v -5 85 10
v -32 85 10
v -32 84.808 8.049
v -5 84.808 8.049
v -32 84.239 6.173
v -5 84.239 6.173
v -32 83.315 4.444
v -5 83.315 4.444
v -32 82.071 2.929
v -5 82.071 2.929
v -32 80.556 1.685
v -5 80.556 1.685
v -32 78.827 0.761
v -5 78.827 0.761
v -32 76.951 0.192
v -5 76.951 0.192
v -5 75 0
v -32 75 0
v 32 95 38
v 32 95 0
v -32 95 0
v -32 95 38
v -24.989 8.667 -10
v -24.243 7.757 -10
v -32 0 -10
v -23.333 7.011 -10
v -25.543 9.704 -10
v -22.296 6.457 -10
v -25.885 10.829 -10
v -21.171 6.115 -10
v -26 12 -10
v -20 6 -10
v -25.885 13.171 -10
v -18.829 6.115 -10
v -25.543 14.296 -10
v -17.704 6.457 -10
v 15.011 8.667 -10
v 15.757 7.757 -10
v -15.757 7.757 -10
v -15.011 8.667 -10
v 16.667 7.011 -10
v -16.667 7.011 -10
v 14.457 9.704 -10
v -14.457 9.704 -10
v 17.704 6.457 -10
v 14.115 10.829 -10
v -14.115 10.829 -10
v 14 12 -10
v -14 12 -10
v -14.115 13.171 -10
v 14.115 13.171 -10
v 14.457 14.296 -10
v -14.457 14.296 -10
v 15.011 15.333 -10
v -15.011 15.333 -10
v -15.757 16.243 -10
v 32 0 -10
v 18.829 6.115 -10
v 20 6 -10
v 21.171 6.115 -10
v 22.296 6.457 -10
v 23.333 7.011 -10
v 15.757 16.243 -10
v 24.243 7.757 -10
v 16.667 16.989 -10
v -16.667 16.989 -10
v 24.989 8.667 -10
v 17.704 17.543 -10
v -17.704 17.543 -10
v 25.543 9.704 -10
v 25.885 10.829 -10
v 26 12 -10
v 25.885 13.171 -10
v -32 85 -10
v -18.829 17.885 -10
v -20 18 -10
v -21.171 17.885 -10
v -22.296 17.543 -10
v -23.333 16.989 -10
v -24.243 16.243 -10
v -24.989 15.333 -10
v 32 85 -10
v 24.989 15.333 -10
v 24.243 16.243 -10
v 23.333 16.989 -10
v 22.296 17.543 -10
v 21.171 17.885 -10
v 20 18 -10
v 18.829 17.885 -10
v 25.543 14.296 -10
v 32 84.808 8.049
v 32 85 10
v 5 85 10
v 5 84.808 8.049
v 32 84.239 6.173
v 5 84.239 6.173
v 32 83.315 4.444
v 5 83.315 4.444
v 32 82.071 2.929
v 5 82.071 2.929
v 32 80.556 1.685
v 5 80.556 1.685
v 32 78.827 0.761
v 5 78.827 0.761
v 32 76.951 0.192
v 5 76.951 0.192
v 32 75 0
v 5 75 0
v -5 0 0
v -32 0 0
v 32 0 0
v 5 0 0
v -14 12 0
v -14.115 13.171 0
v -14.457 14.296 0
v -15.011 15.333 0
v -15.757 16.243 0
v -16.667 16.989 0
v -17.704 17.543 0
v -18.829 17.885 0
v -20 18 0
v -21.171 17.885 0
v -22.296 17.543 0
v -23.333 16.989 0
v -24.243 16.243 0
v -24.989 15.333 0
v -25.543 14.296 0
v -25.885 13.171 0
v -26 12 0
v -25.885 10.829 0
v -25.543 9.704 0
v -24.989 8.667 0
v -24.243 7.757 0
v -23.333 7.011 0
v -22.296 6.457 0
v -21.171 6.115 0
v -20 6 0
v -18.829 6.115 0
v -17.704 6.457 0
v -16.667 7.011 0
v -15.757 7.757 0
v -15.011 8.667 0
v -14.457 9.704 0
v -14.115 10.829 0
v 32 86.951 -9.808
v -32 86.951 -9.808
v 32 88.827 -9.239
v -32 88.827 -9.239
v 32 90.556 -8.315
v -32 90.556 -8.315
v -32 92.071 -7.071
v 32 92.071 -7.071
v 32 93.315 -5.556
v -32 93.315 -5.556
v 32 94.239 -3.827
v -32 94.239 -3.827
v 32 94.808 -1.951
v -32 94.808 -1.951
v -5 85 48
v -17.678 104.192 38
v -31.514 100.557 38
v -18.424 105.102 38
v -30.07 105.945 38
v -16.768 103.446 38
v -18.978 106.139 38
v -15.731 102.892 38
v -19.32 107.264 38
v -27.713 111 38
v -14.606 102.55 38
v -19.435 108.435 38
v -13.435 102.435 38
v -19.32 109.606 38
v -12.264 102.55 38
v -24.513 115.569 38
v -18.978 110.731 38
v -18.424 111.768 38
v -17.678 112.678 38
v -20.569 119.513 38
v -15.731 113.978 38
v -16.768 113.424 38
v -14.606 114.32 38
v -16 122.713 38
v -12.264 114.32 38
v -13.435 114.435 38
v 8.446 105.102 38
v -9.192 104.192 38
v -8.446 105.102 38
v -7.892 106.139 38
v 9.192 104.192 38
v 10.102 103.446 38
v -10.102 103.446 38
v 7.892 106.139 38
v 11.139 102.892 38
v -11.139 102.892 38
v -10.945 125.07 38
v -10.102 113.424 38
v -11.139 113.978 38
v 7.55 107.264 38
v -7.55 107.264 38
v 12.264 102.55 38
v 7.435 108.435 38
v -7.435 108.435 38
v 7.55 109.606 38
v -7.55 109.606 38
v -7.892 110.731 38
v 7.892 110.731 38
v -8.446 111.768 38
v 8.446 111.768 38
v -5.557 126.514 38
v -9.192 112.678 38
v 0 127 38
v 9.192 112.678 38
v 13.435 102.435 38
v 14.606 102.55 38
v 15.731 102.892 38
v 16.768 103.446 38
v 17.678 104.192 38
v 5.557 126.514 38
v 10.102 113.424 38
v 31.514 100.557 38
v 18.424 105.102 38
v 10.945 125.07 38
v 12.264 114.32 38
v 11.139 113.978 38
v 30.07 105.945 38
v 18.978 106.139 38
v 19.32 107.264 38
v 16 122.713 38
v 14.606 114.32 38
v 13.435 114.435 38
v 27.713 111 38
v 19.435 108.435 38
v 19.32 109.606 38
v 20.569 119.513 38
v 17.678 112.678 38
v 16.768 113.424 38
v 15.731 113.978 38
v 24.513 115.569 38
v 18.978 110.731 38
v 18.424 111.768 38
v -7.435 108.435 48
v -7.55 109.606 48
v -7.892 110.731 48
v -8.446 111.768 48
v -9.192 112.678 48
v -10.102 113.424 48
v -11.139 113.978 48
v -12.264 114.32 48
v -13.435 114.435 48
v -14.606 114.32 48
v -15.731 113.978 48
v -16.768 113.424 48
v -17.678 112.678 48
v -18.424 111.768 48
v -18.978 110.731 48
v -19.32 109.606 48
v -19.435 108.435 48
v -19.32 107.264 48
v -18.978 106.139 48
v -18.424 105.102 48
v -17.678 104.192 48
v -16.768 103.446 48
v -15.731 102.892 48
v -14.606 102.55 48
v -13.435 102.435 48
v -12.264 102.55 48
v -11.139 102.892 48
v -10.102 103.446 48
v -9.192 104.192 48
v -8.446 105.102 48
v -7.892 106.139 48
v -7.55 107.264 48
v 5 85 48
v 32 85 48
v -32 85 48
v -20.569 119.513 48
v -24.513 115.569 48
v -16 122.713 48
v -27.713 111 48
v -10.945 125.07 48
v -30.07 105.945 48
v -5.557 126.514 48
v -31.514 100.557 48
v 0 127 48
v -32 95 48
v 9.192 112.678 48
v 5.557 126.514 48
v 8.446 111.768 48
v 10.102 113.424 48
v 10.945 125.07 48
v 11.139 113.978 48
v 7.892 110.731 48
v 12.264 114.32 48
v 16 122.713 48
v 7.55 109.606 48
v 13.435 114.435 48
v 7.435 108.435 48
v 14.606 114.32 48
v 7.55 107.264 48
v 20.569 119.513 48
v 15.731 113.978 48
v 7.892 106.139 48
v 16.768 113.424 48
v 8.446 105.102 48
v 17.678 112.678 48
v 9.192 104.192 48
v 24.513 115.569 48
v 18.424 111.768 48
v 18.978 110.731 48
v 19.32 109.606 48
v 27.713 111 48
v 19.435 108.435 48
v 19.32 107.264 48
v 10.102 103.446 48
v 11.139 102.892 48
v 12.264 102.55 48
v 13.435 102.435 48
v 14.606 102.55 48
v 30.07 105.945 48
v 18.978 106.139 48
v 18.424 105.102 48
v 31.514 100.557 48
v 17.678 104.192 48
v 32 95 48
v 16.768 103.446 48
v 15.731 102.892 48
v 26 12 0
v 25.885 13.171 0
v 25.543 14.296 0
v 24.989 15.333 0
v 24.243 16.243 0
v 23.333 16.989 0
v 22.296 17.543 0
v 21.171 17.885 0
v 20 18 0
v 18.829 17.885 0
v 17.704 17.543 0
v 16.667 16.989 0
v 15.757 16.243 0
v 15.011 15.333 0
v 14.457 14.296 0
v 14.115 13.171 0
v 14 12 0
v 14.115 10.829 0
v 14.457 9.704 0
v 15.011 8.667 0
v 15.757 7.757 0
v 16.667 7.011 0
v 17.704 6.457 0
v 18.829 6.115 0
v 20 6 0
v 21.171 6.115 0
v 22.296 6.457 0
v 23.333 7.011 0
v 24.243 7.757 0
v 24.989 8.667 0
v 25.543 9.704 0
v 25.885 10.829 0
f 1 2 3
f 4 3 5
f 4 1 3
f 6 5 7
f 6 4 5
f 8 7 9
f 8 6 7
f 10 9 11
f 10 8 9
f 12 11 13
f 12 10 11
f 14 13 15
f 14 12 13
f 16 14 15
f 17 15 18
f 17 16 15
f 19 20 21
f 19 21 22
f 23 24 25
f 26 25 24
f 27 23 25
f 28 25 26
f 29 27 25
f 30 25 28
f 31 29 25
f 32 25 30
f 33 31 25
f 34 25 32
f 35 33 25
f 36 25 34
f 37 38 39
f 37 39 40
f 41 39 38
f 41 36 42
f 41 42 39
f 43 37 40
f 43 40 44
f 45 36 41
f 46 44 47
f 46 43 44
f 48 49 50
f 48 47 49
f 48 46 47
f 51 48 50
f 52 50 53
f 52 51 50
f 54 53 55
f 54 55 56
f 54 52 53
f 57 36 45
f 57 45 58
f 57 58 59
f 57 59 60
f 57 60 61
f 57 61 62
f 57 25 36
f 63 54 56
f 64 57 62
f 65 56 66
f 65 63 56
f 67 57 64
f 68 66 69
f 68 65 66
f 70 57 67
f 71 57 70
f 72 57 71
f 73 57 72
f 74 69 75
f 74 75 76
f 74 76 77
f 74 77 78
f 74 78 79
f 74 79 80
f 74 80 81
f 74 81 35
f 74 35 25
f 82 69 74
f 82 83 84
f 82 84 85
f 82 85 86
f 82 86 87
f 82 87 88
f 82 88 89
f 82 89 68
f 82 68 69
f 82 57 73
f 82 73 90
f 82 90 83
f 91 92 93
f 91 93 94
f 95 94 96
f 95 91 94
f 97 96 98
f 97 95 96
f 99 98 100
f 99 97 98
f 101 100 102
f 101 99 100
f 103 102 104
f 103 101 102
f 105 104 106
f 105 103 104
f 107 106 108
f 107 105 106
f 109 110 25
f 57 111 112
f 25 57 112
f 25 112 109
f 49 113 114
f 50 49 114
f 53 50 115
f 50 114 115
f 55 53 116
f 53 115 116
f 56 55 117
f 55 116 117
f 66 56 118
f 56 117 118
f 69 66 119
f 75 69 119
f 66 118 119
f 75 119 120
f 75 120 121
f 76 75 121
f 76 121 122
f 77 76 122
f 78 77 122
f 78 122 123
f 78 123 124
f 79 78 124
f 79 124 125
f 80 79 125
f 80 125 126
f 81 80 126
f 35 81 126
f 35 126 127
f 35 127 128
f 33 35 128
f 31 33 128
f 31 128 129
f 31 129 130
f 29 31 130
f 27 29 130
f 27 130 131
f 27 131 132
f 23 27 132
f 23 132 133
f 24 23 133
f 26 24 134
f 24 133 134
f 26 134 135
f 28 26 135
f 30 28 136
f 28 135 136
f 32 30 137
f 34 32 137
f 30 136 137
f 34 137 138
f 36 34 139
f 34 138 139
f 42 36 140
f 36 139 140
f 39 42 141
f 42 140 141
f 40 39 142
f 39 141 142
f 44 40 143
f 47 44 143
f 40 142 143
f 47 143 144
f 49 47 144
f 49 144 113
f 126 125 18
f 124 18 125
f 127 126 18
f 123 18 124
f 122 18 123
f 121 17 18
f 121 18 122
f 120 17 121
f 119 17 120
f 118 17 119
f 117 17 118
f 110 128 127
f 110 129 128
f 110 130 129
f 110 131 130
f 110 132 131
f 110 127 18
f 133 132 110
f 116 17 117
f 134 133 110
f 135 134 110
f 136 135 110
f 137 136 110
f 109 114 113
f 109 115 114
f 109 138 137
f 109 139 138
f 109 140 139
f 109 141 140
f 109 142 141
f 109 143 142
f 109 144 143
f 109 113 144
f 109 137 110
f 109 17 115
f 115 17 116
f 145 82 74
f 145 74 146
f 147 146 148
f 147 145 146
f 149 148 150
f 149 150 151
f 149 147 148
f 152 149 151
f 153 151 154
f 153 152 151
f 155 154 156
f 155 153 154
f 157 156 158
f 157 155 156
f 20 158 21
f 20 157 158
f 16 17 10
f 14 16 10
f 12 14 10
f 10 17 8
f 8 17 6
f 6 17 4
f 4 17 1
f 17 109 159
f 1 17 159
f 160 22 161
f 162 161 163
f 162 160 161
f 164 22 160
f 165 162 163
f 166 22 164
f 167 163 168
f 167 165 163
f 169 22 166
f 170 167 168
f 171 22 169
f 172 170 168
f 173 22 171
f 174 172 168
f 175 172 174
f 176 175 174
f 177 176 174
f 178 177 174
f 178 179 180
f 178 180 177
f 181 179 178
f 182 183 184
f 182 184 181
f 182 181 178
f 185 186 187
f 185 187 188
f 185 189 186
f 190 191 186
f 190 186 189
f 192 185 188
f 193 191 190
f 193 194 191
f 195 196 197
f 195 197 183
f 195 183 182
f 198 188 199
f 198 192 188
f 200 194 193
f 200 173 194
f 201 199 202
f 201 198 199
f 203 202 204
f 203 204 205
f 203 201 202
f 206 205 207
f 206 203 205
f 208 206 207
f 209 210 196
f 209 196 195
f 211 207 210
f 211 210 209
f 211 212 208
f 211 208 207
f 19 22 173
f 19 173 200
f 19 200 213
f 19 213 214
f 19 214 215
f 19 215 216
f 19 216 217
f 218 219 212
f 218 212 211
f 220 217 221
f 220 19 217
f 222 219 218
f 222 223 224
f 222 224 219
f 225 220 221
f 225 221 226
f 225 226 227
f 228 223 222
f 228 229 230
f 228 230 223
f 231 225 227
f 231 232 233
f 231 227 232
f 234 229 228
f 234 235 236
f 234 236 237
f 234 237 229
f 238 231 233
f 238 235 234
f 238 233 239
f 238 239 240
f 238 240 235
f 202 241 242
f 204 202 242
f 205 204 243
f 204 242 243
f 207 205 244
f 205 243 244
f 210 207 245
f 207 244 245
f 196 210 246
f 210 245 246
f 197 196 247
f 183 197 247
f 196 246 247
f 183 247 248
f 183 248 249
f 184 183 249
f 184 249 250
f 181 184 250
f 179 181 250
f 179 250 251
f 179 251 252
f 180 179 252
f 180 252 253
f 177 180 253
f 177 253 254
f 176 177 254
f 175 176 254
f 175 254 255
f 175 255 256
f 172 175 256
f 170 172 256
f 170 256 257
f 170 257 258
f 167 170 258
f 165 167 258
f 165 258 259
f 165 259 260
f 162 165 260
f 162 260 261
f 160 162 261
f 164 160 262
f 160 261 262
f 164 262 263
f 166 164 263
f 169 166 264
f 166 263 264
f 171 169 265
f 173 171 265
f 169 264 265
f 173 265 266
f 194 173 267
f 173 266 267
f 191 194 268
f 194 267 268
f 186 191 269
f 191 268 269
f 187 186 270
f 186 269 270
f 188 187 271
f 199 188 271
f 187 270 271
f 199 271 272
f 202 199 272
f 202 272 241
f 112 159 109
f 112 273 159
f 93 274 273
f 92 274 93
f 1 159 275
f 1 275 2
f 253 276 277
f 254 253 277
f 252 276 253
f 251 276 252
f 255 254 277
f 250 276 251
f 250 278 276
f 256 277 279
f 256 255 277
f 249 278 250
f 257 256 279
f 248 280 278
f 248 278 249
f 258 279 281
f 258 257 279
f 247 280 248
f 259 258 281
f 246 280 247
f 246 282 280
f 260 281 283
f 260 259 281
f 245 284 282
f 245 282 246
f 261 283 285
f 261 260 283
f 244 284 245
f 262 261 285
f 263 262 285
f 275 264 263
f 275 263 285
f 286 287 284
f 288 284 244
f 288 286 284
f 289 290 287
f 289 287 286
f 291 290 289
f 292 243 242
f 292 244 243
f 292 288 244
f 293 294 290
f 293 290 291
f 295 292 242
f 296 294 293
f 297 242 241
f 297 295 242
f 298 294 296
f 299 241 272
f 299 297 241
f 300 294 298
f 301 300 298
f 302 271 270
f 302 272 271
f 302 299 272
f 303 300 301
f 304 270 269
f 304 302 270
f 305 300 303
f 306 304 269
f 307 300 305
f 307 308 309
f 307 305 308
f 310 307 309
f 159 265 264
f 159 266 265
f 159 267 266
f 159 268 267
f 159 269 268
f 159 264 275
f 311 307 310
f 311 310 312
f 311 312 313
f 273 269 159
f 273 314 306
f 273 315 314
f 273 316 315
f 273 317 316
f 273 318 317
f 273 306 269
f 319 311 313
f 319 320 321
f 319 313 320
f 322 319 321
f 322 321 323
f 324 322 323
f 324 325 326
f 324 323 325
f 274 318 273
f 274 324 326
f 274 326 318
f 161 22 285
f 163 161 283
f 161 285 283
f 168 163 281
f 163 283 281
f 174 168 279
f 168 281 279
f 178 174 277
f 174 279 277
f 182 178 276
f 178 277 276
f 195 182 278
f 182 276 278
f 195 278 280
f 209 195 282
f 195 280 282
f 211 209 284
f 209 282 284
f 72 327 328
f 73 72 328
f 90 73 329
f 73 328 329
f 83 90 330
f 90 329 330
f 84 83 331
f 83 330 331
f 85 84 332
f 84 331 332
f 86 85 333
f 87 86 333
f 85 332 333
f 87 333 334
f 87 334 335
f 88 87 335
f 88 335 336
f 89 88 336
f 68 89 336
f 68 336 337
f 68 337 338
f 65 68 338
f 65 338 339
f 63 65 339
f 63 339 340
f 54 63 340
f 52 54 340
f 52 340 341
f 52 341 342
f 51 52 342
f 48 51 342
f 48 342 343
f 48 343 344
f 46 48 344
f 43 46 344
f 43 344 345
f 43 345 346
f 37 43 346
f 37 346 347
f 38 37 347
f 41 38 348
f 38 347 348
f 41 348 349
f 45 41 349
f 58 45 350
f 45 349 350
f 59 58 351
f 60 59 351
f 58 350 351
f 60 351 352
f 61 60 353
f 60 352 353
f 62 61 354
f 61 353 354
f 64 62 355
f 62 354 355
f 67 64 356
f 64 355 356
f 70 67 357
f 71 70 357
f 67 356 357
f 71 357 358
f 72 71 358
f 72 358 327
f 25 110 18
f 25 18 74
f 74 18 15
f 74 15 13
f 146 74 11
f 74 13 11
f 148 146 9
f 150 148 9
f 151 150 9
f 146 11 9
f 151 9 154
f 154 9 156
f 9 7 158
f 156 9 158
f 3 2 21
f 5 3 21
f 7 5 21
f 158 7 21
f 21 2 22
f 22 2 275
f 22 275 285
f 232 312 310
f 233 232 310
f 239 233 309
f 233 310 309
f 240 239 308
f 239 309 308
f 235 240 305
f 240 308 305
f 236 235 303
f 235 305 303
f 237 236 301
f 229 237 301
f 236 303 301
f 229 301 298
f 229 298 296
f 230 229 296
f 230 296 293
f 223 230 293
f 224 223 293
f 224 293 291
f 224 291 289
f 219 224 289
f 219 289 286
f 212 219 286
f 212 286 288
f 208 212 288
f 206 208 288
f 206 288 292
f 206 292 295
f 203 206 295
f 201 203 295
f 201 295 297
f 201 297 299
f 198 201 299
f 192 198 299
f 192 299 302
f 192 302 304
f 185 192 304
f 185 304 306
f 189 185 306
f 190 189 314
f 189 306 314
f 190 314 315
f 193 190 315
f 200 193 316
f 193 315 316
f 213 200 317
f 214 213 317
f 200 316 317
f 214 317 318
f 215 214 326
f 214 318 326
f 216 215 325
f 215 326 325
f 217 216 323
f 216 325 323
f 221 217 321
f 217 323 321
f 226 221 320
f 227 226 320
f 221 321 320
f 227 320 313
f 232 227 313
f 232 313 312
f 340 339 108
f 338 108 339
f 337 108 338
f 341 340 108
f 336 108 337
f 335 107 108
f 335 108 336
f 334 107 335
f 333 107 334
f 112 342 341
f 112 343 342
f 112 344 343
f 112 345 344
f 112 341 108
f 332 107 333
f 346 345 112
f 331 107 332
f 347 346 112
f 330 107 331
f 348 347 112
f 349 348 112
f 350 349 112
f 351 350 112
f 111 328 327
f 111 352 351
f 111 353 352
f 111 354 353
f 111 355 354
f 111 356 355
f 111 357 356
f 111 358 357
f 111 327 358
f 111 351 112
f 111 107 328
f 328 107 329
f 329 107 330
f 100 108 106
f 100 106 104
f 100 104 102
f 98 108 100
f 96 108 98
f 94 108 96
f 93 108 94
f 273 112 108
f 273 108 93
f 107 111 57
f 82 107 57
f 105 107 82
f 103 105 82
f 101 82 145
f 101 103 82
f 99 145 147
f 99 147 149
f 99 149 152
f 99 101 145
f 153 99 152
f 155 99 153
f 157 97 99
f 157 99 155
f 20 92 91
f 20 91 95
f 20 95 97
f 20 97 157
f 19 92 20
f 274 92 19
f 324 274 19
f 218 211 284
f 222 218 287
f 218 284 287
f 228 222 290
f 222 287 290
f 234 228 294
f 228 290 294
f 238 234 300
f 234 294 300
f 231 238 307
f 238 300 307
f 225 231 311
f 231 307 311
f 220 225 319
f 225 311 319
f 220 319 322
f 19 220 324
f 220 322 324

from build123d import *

# Parameters (mm, degrees)
F1_DEPTH = 5
F2_DEPTH = 32
F4_R     = 6
F5_DEPTH = 58.001


with BuildPart() as f1:
    # F0 (on Right) → F1 (new body, symmetric)
    with BuildSketch(Plane.YZ):
        with BuildLine():
            Line((85, 48), (0, 0))
            Line((0, 0), (75, 0))
            ThreePointArc((75, 0), (82.0710678119, 2.9289321881), (85, 10))
            Line((85, 10), (85, 48))
        make_face()
        with BuildLine():
            Line((75, 0), (0, 0))
            Line((0, 0), (0, -10))
            Line((0, -10), (85, -10))
            ThreePointArc((85, -10), (92.0710678119, -7.0710678119), (95, 0))
            Line((95, 0), (95, 38))
            Line((95, 38), (127, 38))
            Line((127, 38), (127, 48))
            Line((127, 48), (85, 48))
            Line((85, 48), (85, 10))
            ThreePointArc((85, 10), (82.0710678119, 2.9289321881), (75, 0))
        make_face()
    extrude(amount=F1_DEPTH, both=True)

    # F0 (on Right) → F2 (join, symmetric)
    with BuildSketch(Plane.YZ):
        with BuildLine():
            Line((75, 0), (0, 0))
            Line((0, 0), (0, -10))
            Line((0, -10), (85, -10))
            ThreePointArc((85, -10), (92.0710678119, -7.0710678119), (95, 0))
            Line((95, 0), (95, 38))
            Line((95, 38), (127, 38))
            Line((127, 38), (127, 48))
            Line((127, 48), (85, 48))
            Line((85, 48), (85, 10))
            ThreePointArc((85, 10), (82.0710678119, 2.9289321881), (75, 0))
        make_face()
    extrude(amount=F2_DEPTH, both=True)

    # F4 (on face) → F5 (cut, through all)
    with BuildSketch(Plane.XY.offset(48)):
        with BuildLine():
            ThreePointArc((-32, 95), (-22.6274171136, 117.6274168823), (-3.272e-07, 127))
            Line((-3.272e-07, 127), (-32, 127))
            Line((-32, 127), (-32, 95))
        make_face()
        with BuildLine():
            ThreePointArc((-3.272e-07, 127), (22.6274168823, 117.6274171136), (32, 95))
            Line((32, 95), (32, 127))
            Line((32, 127), (-3.272e-07, 127))
        make_face()
        with Locations((13.4350288425, 108.4350288425)):
            Circle(F4_R)
        with Locations((-13.4350288425, 108.4350288425)):
            Circle(F4_R)
        with Locations((-20, 12)):
            Circle(F4_R)
        with Locations((20, 12)):
            Circle(F4_R)
    extrude(amount=-F5_DEPTH, mode=Mode.SUBTRACT)


solid = f1.part
